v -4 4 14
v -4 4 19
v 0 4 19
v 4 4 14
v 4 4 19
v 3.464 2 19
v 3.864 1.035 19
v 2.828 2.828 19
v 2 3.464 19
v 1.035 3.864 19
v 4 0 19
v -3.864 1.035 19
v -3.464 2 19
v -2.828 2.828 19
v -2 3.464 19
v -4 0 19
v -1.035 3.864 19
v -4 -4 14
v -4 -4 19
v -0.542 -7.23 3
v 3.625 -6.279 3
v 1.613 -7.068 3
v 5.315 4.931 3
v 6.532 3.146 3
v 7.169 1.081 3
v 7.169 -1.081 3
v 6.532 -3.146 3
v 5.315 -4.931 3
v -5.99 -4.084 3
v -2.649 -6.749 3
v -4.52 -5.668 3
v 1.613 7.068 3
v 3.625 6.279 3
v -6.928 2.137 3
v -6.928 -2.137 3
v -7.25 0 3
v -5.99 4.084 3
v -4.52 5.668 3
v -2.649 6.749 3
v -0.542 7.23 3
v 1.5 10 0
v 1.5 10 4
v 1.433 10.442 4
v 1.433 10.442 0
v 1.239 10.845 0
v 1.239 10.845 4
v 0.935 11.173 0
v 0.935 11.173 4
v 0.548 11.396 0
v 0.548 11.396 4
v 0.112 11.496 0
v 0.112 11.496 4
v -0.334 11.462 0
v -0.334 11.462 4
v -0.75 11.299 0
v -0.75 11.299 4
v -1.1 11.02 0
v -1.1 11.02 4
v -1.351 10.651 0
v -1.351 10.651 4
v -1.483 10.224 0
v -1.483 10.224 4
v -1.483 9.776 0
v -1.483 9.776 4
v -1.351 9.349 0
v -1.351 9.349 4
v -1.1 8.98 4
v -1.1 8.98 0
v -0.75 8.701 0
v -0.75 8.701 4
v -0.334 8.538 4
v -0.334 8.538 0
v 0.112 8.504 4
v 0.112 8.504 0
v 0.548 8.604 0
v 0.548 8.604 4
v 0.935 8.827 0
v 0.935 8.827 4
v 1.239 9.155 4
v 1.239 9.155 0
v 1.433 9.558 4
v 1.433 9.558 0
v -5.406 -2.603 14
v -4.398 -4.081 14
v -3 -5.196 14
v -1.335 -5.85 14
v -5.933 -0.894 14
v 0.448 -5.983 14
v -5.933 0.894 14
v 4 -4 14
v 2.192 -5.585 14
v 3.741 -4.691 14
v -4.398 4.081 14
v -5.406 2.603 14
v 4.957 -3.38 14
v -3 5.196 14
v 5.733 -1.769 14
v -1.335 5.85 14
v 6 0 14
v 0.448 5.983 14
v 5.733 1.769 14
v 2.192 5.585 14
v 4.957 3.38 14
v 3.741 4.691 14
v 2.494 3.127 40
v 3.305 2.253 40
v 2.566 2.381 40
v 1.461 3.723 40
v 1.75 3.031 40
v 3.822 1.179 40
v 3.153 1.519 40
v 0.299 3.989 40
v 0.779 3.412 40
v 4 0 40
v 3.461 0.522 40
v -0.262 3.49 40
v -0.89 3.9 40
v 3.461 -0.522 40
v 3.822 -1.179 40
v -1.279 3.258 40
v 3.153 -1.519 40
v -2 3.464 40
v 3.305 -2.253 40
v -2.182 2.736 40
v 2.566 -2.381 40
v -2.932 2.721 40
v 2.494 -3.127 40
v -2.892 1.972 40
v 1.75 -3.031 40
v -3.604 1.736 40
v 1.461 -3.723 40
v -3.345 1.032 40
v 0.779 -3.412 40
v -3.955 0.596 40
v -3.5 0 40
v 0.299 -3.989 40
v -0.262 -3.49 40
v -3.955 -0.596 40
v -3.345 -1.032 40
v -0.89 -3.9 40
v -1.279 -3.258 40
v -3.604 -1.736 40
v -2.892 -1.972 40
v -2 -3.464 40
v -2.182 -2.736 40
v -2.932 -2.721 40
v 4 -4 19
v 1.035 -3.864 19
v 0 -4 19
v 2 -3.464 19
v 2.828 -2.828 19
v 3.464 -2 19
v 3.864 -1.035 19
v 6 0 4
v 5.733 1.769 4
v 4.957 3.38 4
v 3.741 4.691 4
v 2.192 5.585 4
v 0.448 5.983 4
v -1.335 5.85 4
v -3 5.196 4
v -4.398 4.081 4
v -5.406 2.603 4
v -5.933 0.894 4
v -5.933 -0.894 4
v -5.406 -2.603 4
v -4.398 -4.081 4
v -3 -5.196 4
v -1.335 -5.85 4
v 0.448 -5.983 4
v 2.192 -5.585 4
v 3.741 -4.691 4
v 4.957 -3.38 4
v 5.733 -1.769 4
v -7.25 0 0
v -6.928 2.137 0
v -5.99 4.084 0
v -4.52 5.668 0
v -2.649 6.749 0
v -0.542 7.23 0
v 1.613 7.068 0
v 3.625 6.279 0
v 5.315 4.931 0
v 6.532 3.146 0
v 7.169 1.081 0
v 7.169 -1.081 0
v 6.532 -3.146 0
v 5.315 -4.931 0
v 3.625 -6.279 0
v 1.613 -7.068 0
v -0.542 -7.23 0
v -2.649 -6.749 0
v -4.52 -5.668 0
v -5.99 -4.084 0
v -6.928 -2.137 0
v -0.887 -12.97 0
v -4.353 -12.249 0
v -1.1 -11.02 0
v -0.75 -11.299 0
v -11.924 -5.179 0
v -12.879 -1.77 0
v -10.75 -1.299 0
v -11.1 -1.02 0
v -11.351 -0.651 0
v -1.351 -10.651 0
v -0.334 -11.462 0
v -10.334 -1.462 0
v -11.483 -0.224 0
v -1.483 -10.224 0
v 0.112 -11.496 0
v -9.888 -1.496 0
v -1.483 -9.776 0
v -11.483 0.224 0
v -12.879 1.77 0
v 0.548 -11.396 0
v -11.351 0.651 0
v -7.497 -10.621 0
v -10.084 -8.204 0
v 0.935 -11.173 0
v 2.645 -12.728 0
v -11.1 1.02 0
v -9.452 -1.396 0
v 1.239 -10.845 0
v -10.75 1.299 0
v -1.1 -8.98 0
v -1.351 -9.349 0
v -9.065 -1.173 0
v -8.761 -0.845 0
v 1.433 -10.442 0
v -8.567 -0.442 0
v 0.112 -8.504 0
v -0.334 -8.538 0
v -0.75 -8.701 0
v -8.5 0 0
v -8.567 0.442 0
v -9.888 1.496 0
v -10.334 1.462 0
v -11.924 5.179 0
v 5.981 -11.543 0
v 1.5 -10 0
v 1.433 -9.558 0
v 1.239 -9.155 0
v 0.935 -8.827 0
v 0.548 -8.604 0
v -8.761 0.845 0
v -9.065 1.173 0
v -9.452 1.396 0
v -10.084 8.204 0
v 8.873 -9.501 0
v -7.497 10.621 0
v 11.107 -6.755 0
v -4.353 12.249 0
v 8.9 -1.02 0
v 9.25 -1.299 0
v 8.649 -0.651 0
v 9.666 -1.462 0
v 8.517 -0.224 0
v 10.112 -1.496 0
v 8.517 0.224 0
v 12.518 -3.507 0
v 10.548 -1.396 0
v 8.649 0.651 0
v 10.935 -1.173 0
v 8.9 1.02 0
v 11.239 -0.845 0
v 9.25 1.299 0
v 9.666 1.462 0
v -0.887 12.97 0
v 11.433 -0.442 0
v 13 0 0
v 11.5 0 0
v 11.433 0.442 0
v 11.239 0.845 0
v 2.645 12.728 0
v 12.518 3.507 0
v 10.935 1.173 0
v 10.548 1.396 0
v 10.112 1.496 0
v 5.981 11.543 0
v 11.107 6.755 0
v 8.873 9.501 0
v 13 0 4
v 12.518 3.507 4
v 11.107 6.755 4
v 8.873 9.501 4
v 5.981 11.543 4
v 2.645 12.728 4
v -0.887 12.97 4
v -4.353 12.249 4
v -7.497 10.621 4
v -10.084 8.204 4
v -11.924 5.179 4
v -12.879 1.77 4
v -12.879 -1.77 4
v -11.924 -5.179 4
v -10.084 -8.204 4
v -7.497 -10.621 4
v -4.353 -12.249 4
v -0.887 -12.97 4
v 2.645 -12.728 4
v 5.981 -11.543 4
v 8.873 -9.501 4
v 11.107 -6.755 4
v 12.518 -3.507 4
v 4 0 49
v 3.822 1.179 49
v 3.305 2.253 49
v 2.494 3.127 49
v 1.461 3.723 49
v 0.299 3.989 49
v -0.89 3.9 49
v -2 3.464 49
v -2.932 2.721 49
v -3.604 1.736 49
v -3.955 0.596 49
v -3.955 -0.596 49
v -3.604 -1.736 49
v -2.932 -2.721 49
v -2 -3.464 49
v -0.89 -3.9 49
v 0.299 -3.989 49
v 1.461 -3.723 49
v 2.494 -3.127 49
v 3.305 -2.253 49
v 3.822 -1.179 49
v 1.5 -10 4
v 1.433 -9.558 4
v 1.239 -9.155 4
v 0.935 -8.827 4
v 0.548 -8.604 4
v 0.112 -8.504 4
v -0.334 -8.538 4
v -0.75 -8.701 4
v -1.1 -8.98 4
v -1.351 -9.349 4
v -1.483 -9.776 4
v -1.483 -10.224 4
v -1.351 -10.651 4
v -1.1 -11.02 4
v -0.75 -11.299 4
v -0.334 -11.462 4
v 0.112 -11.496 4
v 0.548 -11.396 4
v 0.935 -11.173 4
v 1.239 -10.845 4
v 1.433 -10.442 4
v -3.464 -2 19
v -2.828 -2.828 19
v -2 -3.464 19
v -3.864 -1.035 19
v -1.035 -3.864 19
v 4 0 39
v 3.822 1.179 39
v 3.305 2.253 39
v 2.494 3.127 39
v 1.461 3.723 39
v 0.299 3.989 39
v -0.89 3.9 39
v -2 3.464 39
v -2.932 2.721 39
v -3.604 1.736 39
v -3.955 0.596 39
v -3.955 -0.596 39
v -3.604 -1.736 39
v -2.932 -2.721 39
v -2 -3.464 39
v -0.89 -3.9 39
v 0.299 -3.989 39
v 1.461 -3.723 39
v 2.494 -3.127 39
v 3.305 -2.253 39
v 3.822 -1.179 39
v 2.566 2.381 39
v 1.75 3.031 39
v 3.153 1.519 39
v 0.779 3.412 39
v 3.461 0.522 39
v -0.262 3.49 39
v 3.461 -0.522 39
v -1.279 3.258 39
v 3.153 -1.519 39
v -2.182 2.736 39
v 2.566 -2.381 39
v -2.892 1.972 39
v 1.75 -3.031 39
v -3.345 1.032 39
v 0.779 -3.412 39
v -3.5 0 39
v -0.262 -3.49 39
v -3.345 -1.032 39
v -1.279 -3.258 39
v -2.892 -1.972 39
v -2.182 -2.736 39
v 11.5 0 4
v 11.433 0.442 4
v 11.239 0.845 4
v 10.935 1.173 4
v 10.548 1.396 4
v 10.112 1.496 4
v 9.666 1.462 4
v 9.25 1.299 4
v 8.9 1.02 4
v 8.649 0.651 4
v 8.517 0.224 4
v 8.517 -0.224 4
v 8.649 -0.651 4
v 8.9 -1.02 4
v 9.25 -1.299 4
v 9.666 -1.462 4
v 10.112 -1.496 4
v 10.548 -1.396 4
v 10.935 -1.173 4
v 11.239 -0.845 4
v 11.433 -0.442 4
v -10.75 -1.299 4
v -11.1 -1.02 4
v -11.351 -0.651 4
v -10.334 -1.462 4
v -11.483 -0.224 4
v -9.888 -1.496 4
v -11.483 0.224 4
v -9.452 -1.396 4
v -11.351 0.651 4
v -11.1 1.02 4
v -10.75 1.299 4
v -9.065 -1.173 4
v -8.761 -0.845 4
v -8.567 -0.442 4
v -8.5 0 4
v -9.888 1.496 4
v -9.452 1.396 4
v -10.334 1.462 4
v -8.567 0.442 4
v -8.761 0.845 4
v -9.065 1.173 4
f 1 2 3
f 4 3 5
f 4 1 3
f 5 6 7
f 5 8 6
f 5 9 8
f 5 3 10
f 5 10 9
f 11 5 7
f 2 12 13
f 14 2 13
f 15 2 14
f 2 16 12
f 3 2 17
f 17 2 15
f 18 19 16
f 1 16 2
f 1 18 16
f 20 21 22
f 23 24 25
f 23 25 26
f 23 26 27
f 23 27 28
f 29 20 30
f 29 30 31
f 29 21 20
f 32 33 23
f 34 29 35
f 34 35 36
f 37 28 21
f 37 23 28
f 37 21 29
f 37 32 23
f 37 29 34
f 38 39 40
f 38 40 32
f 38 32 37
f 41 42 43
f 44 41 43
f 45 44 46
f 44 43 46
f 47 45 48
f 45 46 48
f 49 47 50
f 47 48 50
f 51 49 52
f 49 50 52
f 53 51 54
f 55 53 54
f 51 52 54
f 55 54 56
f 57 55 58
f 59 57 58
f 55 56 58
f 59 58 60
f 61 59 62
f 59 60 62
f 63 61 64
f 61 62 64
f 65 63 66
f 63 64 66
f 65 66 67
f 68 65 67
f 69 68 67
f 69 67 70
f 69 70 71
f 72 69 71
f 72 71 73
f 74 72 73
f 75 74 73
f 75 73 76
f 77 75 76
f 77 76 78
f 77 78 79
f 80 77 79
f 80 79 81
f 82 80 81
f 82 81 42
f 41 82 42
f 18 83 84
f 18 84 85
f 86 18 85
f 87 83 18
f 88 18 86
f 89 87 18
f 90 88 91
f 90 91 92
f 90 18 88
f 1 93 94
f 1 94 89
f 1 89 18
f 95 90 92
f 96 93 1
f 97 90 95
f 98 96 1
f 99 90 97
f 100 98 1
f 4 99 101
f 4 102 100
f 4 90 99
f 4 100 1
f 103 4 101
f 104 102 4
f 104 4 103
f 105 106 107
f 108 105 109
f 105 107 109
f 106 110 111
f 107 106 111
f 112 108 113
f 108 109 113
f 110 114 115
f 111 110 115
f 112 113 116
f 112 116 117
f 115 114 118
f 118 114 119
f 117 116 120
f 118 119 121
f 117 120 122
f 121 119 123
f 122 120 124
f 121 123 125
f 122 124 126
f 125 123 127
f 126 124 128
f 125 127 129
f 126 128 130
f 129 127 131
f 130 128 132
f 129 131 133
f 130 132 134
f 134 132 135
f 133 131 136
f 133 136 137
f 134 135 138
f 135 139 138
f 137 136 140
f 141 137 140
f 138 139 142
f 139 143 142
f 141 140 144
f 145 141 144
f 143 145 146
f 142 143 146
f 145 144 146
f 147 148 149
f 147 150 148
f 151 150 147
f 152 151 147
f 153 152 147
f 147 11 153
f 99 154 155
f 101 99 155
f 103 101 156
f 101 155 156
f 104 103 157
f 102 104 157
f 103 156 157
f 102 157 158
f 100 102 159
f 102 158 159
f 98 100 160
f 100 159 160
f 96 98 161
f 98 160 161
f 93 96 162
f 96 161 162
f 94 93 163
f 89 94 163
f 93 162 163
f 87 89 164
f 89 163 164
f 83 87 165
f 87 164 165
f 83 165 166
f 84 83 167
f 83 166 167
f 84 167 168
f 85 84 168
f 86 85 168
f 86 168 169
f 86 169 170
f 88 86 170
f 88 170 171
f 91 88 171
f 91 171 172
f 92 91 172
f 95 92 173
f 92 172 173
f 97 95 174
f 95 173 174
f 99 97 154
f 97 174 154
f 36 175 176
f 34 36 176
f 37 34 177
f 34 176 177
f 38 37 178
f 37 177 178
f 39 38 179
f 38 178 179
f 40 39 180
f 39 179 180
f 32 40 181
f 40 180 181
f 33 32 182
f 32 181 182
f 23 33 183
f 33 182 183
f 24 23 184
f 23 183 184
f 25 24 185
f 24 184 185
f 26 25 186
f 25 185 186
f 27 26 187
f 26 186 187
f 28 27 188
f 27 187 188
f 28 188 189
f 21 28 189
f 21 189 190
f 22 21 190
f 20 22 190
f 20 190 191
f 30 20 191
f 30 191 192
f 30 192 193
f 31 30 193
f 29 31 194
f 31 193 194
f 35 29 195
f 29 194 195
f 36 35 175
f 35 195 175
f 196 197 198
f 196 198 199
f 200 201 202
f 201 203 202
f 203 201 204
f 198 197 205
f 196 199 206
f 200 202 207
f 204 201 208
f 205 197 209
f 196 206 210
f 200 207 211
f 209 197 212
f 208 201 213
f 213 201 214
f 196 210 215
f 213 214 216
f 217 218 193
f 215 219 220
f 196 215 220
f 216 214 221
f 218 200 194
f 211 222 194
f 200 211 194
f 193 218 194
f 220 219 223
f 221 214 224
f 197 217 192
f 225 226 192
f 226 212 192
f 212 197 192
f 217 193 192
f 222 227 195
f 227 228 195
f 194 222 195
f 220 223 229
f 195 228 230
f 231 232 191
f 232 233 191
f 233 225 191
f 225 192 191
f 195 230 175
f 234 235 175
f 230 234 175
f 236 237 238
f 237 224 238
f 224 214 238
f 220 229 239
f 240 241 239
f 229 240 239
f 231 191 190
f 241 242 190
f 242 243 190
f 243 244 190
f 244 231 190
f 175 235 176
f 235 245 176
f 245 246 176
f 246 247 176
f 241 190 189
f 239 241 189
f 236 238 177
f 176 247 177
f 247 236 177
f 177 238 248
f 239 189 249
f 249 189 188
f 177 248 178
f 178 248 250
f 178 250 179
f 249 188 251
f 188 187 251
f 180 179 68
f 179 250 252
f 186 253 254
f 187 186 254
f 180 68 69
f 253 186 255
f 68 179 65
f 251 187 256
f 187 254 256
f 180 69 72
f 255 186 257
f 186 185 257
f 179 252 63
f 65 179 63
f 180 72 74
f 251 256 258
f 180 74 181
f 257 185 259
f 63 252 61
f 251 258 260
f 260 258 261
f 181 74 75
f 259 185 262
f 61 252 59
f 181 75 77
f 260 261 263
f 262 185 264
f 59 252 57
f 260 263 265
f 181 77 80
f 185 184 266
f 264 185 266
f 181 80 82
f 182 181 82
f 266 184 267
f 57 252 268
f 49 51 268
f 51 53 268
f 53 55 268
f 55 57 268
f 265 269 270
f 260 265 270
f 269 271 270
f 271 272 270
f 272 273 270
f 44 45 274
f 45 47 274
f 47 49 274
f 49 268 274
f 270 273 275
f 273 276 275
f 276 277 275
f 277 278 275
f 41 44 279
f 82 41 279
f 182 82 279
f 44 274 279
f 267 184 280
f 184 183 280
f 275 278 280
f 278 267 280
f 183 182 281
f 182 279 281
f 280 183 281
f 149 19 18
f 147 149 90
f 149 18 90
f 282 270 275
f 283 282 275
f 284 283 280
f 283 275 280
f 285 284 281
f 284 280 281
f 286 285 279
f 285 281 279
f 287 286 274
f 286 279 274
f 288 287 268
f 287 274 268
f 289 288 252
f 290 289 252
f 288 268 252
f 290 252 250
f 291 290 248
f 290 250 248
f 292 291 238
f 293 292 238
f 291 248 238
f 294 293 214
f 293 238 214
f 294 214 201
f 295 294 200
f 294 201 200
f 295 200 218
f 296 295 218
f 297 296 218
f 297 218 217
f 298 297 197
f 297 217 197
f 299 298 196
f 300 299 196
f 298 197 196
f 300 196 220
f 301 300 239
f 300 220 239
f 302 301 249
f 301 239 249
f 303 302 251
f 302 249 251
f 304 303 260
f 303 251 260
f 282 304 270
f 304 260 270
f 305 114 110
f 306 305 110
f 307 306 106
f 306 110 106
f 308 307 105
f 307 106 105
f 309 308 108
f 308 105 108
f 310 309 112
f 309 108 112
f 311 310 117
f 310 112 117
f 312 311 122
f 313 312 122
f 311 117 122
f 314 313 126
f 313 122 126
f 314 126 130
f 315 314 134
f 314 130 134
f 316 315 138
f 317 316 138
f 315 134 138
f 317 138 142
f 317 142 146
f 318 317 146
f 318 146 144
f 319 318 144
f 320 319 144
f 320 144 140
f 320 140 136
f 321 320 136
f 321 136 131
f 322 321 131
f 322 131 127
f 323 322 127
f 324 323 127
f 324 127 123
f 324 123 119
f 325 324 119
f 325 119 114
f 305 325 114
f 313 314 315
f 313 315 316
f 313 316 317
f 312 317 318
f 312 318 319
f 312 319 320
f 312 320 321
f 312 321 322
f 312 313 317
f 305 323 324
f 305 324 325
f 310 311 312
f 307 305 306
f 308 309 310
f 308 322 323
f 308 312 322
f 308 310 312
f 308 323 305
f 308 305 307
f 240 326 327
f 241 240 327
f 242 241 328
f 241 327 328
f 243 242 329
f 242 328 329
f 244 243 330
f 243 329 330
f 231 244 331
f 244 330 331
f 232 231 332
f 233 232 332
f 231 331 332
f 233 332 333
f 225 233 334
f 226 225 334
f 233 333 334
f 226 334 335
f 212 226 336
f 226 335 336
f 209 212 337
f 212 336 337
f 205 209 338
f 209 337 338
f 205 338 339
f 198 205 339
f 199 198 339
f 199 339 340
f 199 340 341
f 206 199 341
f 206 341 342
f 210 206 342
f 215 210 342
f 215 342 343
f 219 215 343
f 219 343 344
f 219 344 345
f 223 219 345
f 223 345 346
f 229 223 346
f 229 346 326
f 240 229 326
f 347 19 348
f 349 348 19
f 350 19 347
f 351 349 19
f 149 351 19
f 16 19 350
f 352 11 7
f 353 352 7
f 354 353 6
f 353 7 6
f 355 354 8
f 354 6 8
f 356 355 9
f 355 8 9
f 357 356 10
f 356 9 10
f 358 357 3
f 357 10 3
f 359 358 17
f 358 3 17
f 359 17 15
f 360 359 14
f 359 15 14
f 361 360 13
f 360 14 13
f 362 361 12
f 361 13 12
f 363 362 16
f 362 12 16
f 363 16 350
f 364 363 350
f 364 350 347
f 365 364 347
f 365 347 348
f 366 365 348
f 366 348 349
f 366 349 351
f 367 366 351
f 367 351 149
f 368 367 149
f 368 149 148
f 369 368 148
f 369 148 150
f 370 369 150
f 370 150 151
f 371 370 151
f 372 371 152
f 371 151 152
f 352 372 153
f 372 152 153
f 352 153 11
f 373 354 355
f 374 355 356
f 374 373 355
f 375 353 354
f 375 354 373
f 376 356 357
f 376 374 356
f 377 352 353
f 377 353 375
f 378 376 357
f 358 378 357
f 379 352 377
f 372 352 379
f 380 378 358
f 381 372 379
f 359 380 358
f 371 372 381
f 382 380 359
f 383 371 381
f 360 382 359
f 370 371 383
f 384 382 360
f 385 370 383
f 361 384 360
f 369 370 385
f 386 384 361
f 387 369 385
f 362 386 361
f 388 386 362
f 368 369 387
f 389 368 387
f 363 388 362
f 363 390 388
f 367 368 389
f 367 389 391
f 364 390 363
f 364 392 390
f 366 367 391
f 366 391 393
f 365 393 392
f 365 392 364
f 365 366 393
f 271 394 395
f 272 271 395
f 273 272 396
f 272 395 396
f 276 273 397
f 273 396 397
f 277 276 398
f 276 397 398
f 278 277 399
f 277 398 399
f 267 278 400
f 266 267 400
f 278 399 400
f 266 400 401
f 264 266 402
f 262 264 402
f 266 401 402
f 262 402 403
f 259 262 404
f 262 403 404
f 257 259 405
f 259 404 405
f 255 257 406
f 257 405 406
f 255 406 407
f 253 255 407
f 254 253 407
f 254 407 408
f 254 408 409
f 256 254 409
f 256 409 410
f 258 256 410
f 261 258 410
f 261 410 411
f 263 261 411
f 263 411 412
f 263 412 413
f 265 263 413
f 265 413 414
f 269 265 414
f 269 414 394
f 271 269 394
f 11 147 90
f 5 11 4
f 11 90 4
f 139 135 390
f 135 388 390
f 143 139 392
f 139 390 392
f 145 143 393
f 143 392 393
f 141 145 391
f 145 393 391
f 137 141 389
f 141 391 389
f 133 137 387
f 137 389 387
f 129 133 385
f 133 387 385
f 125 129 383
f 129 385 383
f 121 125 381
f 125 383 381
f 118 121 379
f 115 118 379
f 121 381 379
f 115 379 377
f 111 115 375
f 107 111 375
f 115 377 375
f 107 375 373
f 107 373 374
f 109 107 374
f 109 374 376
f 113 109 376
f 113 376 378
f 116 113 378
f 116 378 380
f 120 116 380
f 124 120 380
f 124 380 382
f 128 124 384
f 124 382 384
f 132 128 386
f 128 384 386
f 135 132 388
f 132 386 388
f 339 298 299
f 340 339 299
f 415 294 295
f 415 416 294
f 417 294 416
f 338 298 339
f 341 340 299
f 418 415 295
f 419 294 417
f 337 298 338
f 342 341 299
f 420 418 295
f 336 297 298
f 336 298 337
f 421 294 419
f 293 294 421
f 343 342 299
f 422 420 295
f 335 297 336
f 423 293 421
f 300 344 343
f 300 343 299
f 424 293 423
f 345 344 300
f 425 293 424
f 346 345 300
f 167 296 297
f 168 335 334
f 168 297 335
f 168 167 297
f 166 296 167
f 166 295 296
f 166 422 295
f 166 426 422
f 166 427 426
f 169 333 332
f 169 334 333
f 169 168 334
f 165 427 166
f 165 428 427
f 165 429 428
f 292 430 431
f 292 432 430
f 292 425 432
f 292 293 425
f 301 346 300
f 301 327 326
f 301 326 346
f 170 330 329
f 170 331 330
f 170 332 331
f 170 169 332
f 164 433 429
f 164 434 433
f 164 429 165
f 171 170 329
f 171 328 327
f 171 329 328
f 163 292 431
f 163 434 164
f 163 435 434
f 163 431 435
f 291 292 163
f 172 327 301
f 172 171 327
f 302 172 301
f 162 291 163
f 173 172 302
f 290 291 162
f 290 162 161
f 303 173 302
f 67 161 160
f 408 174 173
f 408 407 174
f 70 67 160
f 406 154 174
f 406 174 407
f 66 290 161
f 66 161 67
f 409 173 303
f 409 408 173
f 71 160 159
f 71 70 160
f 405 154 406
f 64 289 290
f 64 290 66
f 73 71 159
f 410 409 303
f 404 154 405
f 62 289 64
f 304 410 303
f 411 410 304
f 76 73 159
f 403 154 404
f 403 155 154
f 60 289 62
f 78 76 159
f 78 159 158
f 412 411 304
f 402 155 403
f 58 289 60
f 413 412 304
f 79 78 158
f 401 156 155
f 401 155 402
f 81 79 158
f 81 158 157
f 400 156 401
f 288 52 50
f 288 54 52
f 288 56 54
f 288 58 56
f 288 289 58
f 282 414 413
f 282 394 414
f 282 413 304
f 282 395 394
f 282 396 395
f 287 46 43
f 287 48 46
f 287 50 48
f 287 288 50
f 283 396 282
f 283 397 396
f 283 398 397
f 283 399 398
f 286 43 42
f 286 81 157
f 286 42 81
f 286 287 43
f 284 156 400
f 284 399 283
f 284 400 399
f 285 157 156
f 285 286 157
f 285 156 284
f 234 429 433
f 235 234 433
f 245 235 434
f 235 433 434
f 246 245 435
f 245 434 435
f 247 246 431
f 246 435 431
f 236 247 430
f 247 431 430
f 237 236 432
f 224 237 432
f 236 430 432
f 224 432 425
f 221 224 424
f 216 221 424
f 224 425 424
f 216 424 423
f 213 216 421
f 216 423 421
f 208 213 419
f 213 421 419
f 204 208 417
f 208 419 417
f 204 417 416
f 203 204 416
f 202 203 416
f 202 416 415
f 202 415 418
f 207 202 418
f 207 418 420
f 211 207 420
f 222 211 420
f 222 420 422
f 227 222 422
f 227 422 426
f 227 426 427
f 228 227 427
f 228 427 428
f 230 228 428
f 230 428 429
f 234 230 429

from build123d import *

# Parameters (mm, degrees)
SKETCH1_R           = 13
BOSS_EXTRUDE1_DEPTH = 4
SKETCH2_R           = 7.25
CUT_EXTRUDE1_DEPTH  = 3
SKETCH3_R           = 1.5
CUT_EXTRUDE2_DEPTH  = 5
SKETCH6_R           = 6
BOSS_EXTRUDE5_DEPTH = 10
BOSS_EXTRUDE4_START = 10
SKETCH5_W           = 8
SKETCH5_H           = 8
BOSS_EXTRUDE4_DEPTH = 5
BOSS_EXTRUDE3_START = 15
SKETCH4_R           = 4
BOSS_EXTRUDE3_DEPTH = 30
SKETCH10_W          = 2
SKETCH10_H          = 1


with BuildPart() as part:
    # Sketch1 → Boss-Extrude1 (new body)
    with BuildSketch(Plane.XY):
        Circle(SKETCH1_R)
    extrude(amount=BOSS_EXTRUDE1_DEPTH)

    # Sketch2 → Cut-Extrude1 (cut)
    with BuildSketch(Plane(origin=(0, 0, 0), x_dir=(-1, 0, 0), z_dir=(0, 0, -1))):
        Circle(SKETCH2_R)
    extrude(amount=-CUT_EXTRUDE1_DEPTH, mode=Mode.SUBTRACT)

    # Sketch3 → Cut-Extrude2 (cut, through all)
    with BuildSketch(Plane.XY.offset(4)):
        with Locations((0, 10)):
            Circle(SKETCH3_R)
        with Locations((10, 0)):
            Circle(SKETCH3_R)
        with Locations((0, -10)):
            Circle(SKETCH3_R)
        with Locations((-10, 0)):
            Circle(SKETCH3_R)
    extrude(amount=-CUT_EXTRUDE2_DEPTH, mode=Mode.SUBTRACT)

    # Sketch6 → Boss-Extrude5 (add)
    with BuildSketch(Plane.XY.offset(4)):
        Circle(SKETCH6_R)
    extrude(amount=BOSS_EXTRUDE5_DEPTH)

    # Sketch5 → Boss-Extrude4 (add)
    with BuildSketch(Plane.XY.offset(4).offset(BOSS_EXTRUDE4_START)):
        Rectangle(SKETCH5_W, SKETCH5_H)
    extrude(amount=BOSS_EXTRUDE4_DEPTH)

    # Sketch4 → Boss-Extrude3 (add)
    with BuildSketch(Plane.XY.offset(4).offset(BOSS_EXTRUDE3_START)):
        Circle(SKETCH4_R)
    extrude(amount=BOSS_EXTRUDE3_DEPTH)

    # Sketch10 → Cut-Revolve1 (revolve, cut)
    with BuildSketch(Plane(origin=(0, 0, 0), x_dir=(1, 0, 0), z_dir=(0, 1, 0))):
        with Locations((-4.5, -39.5)):
            Rectangle(SKETCH10_W, SKETCH10_H)
    revolve(axis=Axis((0, 0, 0), (0, 0, 1)), mode=Mode.SUBTRACT)


solid = part.part
